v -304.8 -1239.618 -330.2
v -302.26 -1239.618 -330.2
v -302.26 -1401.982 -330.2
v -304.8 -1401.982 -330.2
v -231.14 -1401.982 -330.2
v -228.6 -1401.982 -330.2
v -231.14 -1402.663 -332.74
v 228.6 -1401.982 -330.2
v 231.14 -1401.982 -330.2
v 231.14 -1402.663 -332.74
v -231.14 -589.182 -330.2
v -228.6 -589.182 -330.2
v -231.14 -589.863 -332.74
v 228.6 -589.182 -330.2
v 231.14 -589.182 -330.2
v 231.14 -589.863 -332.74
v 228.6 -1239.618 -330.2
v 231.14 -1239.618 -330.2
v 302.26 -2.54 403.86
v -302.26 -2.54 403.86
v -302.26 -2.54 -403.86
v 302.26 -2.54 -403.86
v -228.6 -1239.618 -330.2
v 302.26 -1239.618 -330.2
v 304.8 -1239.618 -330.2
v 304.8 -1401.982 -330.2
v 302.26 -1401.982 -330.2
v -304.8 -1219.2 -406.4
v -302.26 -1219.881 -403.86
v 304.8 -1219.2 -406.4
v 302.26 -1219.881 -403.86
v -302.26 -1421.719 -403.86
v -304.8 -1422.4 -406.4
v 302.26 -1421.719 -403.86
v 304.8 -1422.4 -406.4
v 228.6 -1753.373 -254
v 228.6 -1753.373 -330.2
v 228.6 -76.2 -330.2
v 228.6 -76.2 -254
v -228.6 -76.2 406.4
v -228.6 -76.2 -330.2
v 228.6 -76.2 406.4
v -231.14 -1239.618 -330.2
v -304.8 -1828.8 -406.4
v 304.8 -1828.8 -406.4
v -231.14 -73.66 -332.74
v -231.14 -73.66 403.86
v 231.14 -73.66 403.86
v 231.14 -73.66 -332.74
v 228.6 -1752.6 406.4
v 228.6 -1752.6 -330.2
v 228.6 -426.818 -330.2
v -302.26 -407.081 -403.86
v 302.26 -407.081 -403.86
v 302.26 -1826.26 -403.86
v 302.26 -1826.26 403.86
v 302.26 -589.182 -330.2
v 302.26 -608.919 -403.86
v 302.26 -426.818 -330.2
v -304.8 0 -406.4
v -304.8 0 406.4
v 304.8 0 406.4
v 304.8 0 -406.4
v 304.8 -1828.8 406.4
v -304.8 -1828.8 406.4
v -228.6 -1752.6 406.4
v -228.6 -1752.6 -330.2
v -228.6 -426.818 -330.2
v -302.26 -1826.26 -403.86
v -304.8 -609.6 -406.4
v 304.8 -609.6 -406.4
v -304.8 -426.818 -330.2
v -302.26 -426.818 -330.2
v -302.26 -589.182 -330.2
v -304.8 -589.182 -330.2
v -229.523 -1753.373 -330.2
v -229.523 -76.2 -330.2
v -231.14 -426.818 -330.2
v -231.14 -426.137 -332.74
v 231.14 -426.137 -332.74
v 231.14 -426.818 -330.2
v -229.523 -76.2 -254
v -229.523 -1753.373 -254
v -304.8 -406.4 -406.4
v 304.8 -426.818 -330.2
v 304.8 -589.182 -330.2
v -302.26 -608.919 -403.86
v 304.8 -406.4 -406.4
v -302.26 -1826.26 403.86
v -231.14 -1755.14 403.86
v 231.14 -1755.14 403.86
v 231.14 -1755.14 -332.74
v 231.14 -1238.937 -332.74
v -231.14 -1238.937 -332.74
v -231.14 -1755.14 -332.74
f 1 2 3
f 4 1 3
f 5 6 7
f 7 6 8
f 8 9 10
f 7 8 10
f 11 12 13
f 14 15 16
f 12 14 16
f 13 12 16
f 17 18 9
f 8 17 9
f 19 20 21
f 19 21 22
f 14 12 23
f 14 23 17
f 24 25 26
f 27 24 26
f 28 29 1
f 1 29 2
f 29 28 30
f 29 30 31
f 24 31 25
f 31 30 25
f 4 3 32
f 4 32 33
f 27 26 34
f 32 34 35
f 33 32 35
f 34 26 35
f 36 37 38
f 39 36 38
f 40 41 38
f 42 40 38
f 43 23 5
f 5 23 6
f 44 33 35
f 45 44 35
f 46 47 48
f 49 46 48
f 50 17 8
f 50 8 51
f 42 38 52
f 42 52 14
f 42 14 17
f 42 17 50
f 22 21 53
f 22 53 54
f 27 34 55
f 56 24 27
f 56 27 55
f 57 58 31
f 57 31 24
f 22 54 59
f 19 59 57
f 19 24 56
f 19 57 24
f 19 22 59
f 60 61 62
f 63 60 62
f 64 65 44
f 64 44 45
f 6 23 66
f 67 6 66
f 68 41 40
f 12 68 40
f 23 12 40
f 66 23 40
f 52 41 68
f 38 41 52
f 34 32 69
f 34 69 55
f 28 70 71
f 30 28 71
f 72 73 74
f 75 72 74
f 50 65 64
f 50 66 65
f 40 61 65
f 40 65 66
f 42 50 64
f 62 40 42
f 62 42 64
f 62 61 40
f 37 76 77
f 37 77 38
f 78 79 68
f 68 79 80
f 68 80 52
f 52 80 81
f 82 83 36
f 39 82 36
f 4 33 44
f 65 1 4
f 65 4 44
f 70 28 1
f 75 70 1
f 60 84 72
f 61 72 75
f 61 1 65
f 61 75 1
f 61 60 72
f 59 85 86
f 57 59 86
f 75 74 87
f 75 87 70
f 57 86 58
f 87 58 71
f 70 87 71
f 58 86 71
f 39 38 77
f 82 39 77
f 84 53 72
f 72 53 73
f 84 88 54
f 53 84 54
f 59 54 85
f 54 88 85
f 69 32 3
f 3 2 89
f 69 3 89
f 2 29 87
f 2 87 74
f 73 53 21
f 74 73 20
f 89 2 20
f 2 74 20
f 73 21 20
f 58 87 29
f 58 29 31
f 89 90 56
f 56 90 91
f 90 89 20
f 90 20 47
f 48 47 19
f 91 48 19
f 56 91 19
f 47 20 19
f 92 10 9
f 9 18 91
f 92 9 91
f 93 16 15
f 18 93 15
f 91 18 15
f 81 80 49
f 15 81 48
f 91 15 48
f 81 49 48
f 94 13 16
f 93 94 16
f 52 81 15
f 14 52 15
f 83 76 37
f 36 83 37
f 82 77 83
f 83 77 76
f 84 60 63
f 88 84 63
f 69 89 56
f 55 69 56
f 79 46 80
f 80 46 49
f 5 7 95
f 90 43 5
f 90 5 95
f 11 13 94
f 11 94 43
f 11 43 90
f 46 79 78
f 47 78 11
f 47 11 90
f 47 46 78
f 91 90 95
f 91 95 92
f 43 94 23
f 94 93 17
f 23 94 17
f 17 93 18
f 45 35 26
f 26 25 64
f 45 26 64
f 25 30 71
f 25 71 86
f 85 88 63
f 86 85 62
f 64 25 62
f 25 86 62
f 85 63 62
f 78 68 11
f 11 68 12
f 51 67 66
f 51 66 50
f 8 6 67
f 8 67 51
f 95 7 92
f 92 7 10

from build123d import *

# Parameters (mm, degrees)
F0_W     = 609.6
F0_H     = 812.8
F1_DEPTH = 1828.8
F2_T     = -76.2
F4_T     = -2.54
F5_DEPTH = 609.6
F6_W     = 457.2
F6_H     = 350.6177284633
F7_DEPTH = 76.2


with BuildPart() as f1:
    # F0 (on Front) → F1 (new body)
    with BuildSketch(Plane.XZ):
        Rectangle(F0_W, F0_H)
    extrude(amount=F1_DEPTH)

    # F2
    f2_openings = [f1.faces().sort_by_distance(p)[0] for p in [
        (0, -914.4, 406.4),
    ]]
    offset(amount=F2_T, openings=f2_openings)

    # F4 (hollow: no face is removed)
    offset(amount=F4_T, kind=Kind.INTERSECTION, mode=Mode.SUBTRACT)

    # F3 (on face) → F5 (cut)
    with BuildSketch(Plane.YZ.offset(304.8)):
        Polygon((-1422.4, -406.4), (-1219.2, -406.4), (-1239.6177284633, -330.2), (-1401.9822715367, -330.2), align=None)
        Polygon((-589.1822715367, -330.2), (-609.6, -406.4), (-406.4, -406.4), (-426.8177284633, -330.2), align=None)
    extrude(amount=-F5_DEPTH, mode=Mode.SUBTRACT)


with BuildPart() as f7:
    # F6 (on face) → F7 (new body)
    with BuildSketch(Plane.XY.offset(-330.2)):
        with Locations((0, -251.5088642316)):
            Rectangle(F6_W, F6_H)
        Polygon((-228.6, -426.8177284633), (-228.6, -76.2), (-229.5225858688, -76.2), (-229.5225858688, -1753.3730268478), (228.6, -1753.3730268478), (228.6, -426.8177284633), align=None)
    extrude(amount=F7_DEPTH)


solid = Compound([f1.part, f7.part])
